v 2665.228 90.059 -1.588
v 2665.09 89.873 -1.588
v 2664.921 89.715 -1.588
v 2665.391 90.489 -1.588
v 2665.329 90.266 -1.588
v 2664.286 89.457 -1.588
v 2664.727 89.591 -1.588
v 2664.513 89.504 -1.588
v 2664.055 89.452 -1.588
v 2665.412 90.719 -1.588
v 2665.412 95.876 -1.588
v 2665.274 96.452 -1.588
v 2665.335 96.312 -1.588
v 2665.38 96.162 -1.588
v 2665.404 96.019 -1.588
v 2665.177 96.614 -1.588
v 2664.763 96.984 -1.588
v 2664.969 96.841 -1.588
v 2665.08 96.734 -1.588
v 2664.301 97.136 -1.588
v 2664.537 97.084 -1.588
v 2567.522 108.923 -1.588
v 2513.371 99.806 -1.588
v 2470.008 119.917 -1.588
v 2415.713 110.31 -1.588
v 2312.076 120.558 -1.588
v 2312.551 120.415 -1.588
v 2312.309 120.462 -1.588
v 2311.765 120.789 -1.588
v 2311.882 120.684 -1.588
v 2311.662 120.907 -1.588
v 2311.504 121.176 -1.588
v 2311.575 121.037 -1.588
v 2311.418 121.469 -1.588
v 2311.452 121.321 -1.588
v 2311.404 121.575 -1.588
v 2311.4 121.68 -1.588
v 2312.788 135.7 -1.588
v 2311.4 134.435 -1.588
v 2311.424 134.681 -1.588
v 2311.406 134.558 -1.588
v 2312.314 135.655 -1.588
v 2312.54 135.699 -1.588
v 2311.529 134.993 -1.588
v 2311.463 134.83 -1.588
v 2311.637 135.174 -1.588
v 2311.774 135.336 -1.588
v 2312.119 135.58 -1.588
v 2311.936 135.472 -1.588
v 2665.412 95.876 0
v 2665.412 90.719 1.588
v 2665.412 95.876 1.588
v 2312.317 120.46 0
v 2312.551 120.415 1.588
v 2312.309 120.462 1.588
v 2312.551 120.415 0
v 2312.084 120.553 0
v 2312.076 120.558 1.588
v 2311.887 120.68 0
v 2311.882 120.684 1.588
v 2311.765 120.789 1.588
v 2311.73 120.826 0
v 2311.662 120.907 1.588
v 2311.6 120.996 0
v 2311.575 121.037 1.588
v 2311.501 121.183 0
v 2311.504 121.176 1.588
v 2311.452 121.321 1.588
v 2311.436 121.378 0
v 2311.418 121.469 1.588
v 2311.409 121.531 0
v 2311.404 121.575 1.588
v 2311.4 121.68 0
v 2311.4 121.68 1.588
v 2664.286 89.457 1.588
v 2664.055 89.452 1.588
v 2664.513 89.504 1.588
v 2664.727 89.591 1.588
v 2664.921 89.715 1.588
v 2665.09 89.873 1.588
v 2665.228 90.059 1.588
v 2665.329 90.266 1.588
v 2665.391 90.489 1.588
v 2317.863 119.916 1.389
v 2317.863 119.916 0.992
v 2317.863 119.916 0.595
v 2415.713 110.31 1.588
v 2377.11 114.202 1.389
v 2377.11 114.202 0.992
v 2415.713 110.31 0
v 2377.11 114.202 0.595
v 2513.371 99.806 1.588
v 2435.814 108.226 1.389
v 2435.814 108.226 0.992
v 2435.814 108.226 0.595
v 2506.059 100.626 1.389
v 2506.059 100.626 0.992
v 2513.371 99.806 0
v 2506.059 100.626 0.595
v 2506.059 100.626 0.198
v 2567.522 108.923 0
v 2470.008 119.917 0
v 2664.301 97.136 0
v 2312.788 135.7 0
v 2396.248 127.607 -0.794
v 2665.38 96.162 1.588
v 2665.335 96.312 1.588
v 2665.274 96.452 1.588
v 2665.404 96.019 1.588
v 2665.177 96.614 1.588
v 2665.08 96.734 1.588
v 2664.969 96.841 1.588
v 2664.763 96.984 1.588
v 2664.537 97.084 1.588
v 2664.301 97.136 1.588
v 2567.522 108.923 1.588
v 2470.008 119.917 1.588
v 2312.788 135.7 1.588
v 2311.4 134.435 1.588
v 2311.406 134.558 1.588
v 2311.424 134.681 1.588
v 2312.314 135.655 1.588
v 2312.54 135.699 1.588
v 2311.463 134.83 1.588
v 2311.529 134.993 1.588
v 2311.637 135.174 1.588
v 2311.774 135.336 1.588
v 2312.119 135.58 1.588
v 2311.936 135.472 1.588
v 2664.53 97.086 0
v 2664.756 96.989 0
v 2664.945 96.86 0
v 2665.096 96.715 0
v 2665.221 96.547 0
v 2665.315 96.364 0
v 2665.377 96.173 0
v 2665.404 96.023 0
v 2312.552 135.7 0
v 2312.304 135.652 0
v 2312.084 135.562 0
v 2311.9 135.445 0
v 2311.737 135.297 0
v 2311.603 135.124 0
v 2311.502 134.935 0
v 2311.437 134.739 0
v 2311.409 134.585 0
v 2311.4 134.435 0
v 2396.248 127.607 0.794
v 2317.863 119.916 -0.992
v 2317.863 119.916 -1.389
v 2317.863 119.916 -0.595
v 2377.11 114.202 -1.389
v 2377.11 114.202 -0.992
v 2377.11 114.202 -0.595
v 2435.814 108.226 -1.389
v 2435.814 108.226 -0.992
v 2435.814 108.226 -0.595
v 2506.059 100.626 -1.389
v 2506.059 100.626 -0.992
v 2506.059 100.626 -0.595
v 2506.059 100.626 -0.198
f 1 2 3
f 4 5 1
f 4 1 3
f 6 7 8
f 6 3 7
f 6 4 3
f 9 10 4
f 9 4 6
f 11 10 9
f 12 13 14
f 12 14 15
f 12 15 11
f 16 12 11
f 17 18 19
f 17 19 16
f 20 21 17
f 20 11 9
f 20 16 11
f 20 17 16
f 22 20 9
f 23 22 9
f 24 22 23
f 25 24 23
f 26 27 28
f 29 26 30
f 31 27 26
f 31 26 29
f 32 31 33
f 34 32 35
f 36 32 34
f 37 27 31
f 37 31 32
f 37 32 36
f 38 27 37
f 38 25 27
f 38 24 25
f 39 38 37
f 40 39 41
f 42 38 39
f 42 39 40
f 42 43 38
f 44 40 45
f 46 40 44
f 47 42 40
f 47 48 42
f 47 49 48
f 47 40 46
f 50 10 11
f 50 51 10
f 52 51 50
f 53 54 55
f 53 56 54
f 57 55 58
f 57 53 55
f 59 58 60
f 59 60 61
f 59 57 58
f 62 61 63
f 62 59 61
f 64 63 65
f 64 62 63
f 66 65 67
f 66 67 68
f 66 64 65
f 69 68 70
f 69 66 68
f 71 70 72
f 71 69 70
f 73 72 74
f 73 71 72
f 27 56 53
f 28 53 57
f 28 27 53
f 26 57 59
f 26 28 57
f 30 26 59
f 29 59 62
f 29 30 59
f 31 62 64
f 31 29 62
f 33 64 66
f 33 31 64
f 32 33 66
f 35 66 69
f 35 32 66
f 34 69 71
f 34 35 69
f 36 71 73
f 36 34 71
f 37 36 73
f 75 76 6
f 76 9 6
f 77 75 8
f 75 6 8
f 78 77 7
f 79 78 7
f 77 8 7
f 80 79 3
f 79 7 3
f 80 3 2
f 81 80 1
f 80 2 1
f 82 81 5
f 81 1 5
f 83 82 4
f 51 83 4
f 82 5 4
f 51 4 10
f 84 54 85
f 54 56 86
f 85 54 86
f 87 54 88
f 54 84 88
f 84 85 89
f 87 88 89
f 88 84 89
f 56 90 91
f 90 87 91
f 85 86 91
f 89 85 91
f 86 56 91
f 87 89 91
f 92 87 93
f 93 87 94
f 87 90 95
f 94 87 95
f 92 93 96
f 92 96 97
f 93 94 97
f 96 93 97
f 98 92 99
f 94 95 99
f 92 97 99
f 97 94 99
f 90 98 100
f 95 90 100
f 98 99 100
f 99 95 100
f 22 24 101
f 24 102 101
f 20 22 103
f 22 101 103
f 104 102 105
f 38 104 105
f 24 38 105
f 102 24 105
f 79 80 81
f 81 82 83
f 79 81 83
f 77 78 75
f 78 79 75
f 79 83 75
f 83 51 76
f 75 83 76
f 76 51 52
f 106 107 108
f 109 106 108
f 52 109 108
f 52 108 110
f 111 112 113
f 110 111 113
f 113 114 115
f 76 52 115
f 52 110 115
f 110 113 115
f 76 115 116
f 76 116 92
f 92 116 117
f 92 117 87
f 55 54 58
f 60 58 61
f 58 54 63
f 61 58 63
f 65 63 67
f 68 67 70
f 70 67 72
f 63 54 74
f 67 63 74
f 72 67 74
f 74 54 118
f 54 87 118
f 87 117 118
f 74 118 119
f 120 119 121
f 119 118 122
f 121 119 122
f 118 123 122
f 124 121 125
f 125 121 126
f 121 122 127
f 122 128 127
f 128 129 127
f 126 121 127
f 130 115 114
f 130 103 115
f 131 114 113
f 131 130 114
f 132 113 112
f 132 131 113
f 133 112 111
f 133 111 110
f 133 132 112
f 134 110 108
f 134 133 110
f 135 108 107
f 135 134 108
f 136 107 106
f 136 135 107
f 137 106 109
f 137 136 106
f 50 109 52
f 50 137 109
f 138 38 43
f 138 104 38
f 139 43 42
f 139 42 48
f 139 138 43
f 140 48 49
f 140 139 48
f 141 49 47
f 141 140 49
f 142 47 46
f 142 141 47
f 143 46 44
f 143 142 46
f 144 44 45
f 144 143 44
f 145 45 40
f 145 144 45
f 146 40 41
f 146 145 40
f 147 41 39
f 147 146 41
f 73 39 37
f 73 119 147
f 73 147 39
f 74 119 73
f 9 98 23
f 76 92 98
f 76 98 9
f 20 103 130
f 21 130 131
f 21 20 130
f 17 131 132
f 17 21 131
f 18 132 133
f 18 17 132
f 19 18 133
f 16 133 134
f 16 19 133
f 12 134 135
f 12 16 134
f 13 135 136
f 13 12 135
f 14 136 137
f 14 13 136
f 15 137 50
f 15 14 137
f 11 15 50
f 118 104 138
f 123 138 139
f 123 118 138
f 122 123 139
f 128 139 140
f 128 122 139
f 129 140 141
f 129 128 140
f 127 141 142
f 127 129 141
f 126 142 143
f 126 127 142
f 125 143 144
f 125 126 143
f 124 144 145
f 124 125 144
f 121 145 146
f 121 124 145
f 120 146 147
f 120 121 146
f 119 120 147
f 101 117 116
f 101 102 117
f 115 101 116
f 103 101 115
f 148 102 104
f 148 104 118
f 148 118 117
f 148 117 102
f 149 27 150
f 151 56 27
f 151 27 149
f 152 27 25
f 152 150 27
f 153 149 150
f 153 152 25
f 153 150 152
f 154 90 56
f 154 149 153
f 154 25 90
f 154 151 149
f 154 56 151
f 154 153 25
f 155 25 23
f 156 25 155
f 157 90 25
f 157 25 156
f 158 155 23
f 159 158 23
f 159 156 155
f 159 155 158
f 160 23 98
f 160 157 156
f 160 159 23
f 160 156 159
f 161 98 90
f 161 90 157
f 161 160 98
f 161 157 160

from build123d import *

# Parameters (mm, degrees)
BOSS_EXTRUDE1_DEPTH = 1.5875
FILLET1_R           = 1.27


with BuildPart() as part:
    # Sketch2 → Boss-Extrude1 (new body, symmetric)
    with BuildSketch(Plane.XY):
        with BuildLine():
            add(Edge.make_bspline(
                [(2311.4, 135.829939705), (2328.342945407, 134.244574235), (2345.393069943, 132.62356173), (2362.559217098, 130.963943098), (2433.544115673, 123.962494813), (2504.529014249, 116.360848787), (2558.570986897, 110.161821317), (2612.080990815, 103.726427275), (2665.4125, 96.996301665)],
                knots=[225.60075304, 225.60075304, 225.60075304, 225.60075304, 225.60075304, 225.60075304, 233.9431167, 233.9431167, 233.9431167, 260.757015076, 260.757015076, 260.757015076, 260.757015076, 260.757015076, 260.757015076], degree=5))
            Line((2311.4, 135.829939705), (2311.4, 120.523308441))
            add(Edge.make_bspline(
                [(2311.4, 120.523308441), (2313.552310931, 120.321692016), (2325.557433475, 119.19433883), (2347.551509172, 117.100365283), (2377.159899727, 114.21011853), (2406.469653851, 111.26896801), (2435.81832606, 108.240091266), (2469.024707522, 104.715289085), (2494.87246064, 101.880060077), (2510.934244559, 100.080155034), (2513.371052459, 99.806213346)],
                knots=[225.740445061, 225.740445061, 225.740445061, 225.740445061, 226.376989508, 229.287698684, 232.19840786, 235.109117037, 238.019826213, 240.930535389, 244.998118743, 245.725796037, 245.725796037, 245.725796037, 245.725796037], degree=3))
            Line((2513.371052459, 99.806213346), (2665.4125, 89.358331764))
            Line((2665.4125, 89.358331764), (2665.4125, 96.996301665))
        make_face()
    extrude(amount=BOSS_EXTRUDE1_DEPTH, both=True)

    # Fillet1
    fillet1_edges = [part.edges().sort_by_distance(p)[0] for p in [
        (2311.4, 120.523308441, -0.79375),
        (2311.4, 135.829939705, 0.79375),
        (2665.4125, 96.996301665, -0.79375),
        (2665.4125, 89.358331764, 0),
    ]]
    fillet(fillet1_edges, radius=FILLET1_R)


solid = part.part
